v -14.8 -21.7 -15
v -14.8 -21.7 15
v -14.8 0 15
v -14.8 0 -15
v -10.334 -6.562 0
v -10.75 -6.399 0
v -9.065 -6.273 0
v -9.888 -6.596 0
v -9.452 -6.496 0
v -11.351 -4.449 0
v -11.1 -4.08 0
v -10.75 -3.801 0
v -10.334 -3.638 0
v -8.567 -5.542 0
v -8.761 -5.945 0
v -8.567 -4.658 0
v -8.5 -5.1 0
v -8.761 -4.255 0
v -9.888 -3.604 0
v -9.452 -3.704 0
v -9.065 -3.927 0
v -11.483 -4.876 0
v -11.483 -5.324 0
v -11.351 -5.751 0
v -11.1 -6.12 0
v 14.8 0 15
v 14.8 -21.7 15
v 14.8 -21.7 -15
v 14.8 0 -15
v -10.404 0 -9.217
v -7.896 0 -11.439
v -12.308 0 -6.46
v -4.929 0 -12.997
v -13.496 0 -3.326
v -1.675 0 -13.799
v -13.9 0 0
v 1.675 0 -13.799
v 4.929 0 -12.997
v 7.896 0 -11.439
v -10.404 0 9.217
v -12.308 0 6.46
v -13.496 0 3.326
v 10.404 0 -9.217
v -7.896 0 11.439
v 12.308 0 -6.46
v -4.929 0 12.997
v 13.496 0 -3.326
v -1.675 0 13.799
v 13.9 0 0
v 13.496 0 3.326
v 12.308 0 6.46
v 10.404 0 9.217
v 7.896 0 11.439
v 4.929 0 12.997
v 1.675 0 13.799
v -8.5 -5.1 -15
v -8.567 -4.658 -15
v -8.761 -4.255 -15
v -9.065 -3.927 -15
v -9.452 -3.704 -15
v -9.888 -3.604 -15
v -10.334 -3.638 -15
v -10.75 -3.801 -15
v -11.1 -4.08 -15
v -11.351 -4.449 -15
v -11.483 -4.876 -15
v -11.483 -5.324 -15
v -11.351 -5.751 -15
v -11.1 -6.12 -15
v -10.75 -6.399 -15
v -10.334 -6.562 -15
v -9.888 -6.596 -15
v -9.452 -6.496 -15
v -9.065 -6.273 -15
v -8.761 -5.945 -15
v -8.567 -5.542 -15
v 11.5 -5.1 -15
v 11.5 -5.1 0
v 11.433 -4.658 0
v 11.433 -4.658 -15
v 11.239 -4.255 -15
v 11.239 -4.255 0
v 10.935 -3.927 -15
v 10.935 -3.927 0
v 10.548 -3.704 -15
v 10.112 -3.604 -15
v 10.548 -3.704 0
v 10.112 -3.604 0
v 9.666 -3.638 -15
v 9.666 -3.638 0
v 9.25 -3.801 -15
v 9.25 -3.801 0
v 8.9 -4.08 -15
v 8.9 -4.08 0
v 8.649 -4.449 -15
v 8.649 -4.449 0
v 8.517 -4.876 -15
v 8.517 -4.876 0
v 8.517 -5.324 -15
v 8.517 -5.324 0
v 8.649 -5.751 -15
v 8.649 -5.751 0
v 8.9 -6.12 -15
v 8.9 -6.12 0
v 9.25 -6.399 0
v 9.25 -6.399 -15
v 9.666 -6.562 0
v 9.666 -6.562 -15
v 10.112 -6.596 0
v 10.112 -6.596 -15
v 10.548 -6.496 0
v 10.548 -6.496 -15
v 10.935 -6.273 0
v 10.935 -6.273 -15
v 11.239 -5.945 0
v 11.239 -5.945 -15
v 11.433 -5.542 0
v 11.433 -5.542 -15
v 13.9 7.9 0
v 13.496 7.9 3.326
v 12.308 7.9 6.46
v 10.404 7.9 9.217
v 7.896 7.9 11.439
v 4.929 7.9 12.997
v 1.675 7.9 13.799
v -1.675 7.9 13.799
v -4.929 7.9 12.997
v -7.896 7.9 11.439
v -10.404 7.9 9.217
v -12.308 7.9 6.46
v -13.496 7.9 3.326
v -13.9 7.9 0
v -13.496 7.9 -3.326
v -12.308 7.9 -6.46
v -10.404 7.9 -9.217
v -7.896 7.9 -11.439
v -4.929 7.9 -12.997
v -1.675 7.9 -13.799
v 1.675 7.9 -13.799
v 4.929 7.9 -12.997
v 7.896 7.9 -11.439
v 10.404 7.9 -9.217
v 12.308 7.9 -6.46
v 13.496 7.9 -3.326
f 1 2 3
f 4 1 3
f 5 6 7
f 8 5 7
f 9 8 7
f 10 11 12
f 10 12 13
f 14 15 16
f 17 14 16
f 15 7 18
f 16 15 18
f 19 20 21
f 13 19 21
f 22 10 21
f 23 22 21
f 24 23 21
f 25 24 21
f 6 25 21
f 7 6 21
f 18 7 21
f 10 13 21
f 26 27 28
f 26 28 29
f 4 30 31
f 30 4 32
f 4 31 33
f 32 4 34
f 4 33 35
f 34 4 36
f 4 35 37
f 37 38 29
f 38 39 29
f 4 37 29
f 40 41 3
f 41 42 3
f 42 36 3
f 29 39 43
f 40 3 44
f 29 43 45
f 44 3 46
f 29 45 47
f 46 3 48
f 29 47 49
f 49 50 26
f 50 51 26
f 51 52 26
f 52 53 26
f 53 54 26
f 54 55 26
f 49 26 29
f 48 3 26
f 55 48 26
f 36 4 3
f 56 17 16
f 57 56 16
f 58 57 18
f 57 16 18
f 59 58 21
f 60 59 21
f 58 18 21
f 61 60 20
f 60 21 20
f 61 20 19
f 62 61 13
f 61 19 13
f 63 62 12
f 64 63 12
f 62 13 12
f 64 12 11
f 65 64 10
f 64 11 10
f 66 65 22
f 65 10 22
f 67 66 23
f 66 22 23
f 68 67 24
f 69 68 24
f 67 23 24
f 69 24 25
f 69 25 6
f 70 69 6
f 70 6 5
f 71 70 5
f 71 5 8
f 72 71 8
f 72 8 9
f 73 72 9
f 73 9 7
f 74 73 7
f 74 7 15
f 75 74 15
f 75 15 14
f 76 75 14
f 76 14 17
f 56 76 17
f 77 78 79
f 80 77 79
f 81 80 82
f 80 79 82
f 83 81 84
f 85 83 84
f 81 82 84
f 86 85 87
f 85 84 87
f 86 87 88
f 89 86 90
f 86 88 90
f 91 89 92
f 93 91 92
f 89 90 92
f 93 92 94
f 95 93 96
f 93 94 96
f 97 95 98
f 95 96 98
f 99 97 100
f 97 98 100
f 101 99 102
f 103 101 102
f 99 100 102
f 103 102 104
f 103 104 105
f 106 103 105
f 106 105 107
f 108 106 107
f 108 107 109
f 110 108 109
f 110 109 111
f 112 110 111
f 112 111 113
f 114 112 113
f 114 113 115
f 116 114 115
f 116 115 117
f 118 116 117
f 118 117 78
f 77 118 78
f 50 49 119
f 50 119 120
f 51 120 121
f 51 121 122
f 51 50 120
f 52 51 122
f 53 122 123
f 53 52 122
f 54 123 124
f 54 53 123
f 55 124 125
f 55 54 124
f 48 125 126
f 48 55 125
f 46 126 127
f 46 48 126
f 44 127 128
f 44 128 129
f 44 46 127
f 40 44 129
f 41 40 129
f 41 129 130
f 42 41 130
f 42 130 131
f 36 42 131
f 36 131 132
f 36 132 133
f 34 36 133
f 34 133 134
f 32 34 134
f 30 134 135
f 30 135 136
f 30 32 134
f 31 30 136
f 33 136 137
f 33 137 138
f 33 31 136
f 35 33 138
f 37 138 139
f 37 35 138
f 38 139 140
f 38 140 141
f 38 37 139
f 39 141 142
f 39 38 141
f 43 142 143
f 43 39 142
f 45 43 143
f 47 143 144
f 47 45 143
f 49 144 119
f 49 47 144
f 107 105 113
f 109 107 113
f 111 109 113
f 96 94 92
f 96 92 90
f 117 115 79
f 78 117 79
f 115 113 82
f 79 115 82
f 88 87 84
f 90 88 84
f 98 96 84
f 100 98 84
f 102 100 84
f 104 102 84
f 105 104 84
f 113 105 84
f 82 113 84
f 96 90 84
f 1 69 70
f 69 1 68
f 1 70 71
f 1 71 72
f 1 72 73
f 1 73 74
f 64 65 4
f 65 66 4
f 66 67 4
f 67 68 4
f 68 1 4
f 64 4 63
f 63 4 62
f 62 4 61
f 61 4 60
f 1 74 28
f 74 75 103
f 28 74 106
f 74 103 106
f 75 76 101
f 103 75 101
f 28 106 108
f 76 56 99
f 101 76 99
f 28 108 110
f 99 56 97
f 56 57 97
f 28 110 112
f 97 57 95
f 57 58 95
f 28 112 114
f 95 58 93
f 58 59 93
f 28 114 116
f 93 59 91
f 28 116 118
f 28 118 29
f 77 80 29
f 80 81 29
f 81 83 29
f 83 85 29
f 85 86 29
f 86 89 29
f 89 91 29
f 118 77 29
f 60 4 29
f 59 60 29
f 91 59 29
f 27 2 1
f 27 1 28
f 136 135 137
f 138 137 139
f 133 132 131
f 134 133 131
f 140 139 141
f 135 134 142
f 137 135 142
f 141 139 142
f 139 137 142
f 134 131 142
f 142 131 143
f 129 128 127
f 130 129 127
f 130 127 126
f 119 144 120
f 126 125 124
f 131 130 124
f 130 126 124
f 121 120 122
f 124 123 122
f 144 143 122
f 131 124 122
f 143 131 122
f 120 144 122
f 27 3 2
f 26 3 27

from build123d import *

# Parameters (mm, degrees)
SKETCH001_W  = 29.6
SKETCH001_H  = 21.7
PAD001_DEPTH = 15
SKETCH003_R  = 13.9
PAD002_DEPTH = 7.9
SKETCH004_R  = 1.5
POCKET_DEPTH = 15.001


with BuildPart() as part:
    # Sketch001 → Pad001 (new body, symmetric)
    with BuildSketch(Plane.XY):
        with Locations((0, -10.85)):
            Rectangle(SKETCH001_W, SKETCH001_H)
    extrude(amount=PAD001_DEPTH, both=True)

    # Sketch003 → Pad002 (join)
    with BuildSketch(Plane.XZ):
        Circle(SKETCH003_R)
    extrude(amount=-PAD002_DEPTH)

    # Sketch004 → Pocket (cut, through all)
    with BuildSketch(Plane.XY):
        with Locations((-10, -5.1)):
            Circle(SKETCH004_R)
        with Locations((10, -5.1)):
            Circle(SKETCH004_R)
    extrude(amount=-POCKET_DEPTH, mode=Mode.SUBTRACT)


solid = part.part
